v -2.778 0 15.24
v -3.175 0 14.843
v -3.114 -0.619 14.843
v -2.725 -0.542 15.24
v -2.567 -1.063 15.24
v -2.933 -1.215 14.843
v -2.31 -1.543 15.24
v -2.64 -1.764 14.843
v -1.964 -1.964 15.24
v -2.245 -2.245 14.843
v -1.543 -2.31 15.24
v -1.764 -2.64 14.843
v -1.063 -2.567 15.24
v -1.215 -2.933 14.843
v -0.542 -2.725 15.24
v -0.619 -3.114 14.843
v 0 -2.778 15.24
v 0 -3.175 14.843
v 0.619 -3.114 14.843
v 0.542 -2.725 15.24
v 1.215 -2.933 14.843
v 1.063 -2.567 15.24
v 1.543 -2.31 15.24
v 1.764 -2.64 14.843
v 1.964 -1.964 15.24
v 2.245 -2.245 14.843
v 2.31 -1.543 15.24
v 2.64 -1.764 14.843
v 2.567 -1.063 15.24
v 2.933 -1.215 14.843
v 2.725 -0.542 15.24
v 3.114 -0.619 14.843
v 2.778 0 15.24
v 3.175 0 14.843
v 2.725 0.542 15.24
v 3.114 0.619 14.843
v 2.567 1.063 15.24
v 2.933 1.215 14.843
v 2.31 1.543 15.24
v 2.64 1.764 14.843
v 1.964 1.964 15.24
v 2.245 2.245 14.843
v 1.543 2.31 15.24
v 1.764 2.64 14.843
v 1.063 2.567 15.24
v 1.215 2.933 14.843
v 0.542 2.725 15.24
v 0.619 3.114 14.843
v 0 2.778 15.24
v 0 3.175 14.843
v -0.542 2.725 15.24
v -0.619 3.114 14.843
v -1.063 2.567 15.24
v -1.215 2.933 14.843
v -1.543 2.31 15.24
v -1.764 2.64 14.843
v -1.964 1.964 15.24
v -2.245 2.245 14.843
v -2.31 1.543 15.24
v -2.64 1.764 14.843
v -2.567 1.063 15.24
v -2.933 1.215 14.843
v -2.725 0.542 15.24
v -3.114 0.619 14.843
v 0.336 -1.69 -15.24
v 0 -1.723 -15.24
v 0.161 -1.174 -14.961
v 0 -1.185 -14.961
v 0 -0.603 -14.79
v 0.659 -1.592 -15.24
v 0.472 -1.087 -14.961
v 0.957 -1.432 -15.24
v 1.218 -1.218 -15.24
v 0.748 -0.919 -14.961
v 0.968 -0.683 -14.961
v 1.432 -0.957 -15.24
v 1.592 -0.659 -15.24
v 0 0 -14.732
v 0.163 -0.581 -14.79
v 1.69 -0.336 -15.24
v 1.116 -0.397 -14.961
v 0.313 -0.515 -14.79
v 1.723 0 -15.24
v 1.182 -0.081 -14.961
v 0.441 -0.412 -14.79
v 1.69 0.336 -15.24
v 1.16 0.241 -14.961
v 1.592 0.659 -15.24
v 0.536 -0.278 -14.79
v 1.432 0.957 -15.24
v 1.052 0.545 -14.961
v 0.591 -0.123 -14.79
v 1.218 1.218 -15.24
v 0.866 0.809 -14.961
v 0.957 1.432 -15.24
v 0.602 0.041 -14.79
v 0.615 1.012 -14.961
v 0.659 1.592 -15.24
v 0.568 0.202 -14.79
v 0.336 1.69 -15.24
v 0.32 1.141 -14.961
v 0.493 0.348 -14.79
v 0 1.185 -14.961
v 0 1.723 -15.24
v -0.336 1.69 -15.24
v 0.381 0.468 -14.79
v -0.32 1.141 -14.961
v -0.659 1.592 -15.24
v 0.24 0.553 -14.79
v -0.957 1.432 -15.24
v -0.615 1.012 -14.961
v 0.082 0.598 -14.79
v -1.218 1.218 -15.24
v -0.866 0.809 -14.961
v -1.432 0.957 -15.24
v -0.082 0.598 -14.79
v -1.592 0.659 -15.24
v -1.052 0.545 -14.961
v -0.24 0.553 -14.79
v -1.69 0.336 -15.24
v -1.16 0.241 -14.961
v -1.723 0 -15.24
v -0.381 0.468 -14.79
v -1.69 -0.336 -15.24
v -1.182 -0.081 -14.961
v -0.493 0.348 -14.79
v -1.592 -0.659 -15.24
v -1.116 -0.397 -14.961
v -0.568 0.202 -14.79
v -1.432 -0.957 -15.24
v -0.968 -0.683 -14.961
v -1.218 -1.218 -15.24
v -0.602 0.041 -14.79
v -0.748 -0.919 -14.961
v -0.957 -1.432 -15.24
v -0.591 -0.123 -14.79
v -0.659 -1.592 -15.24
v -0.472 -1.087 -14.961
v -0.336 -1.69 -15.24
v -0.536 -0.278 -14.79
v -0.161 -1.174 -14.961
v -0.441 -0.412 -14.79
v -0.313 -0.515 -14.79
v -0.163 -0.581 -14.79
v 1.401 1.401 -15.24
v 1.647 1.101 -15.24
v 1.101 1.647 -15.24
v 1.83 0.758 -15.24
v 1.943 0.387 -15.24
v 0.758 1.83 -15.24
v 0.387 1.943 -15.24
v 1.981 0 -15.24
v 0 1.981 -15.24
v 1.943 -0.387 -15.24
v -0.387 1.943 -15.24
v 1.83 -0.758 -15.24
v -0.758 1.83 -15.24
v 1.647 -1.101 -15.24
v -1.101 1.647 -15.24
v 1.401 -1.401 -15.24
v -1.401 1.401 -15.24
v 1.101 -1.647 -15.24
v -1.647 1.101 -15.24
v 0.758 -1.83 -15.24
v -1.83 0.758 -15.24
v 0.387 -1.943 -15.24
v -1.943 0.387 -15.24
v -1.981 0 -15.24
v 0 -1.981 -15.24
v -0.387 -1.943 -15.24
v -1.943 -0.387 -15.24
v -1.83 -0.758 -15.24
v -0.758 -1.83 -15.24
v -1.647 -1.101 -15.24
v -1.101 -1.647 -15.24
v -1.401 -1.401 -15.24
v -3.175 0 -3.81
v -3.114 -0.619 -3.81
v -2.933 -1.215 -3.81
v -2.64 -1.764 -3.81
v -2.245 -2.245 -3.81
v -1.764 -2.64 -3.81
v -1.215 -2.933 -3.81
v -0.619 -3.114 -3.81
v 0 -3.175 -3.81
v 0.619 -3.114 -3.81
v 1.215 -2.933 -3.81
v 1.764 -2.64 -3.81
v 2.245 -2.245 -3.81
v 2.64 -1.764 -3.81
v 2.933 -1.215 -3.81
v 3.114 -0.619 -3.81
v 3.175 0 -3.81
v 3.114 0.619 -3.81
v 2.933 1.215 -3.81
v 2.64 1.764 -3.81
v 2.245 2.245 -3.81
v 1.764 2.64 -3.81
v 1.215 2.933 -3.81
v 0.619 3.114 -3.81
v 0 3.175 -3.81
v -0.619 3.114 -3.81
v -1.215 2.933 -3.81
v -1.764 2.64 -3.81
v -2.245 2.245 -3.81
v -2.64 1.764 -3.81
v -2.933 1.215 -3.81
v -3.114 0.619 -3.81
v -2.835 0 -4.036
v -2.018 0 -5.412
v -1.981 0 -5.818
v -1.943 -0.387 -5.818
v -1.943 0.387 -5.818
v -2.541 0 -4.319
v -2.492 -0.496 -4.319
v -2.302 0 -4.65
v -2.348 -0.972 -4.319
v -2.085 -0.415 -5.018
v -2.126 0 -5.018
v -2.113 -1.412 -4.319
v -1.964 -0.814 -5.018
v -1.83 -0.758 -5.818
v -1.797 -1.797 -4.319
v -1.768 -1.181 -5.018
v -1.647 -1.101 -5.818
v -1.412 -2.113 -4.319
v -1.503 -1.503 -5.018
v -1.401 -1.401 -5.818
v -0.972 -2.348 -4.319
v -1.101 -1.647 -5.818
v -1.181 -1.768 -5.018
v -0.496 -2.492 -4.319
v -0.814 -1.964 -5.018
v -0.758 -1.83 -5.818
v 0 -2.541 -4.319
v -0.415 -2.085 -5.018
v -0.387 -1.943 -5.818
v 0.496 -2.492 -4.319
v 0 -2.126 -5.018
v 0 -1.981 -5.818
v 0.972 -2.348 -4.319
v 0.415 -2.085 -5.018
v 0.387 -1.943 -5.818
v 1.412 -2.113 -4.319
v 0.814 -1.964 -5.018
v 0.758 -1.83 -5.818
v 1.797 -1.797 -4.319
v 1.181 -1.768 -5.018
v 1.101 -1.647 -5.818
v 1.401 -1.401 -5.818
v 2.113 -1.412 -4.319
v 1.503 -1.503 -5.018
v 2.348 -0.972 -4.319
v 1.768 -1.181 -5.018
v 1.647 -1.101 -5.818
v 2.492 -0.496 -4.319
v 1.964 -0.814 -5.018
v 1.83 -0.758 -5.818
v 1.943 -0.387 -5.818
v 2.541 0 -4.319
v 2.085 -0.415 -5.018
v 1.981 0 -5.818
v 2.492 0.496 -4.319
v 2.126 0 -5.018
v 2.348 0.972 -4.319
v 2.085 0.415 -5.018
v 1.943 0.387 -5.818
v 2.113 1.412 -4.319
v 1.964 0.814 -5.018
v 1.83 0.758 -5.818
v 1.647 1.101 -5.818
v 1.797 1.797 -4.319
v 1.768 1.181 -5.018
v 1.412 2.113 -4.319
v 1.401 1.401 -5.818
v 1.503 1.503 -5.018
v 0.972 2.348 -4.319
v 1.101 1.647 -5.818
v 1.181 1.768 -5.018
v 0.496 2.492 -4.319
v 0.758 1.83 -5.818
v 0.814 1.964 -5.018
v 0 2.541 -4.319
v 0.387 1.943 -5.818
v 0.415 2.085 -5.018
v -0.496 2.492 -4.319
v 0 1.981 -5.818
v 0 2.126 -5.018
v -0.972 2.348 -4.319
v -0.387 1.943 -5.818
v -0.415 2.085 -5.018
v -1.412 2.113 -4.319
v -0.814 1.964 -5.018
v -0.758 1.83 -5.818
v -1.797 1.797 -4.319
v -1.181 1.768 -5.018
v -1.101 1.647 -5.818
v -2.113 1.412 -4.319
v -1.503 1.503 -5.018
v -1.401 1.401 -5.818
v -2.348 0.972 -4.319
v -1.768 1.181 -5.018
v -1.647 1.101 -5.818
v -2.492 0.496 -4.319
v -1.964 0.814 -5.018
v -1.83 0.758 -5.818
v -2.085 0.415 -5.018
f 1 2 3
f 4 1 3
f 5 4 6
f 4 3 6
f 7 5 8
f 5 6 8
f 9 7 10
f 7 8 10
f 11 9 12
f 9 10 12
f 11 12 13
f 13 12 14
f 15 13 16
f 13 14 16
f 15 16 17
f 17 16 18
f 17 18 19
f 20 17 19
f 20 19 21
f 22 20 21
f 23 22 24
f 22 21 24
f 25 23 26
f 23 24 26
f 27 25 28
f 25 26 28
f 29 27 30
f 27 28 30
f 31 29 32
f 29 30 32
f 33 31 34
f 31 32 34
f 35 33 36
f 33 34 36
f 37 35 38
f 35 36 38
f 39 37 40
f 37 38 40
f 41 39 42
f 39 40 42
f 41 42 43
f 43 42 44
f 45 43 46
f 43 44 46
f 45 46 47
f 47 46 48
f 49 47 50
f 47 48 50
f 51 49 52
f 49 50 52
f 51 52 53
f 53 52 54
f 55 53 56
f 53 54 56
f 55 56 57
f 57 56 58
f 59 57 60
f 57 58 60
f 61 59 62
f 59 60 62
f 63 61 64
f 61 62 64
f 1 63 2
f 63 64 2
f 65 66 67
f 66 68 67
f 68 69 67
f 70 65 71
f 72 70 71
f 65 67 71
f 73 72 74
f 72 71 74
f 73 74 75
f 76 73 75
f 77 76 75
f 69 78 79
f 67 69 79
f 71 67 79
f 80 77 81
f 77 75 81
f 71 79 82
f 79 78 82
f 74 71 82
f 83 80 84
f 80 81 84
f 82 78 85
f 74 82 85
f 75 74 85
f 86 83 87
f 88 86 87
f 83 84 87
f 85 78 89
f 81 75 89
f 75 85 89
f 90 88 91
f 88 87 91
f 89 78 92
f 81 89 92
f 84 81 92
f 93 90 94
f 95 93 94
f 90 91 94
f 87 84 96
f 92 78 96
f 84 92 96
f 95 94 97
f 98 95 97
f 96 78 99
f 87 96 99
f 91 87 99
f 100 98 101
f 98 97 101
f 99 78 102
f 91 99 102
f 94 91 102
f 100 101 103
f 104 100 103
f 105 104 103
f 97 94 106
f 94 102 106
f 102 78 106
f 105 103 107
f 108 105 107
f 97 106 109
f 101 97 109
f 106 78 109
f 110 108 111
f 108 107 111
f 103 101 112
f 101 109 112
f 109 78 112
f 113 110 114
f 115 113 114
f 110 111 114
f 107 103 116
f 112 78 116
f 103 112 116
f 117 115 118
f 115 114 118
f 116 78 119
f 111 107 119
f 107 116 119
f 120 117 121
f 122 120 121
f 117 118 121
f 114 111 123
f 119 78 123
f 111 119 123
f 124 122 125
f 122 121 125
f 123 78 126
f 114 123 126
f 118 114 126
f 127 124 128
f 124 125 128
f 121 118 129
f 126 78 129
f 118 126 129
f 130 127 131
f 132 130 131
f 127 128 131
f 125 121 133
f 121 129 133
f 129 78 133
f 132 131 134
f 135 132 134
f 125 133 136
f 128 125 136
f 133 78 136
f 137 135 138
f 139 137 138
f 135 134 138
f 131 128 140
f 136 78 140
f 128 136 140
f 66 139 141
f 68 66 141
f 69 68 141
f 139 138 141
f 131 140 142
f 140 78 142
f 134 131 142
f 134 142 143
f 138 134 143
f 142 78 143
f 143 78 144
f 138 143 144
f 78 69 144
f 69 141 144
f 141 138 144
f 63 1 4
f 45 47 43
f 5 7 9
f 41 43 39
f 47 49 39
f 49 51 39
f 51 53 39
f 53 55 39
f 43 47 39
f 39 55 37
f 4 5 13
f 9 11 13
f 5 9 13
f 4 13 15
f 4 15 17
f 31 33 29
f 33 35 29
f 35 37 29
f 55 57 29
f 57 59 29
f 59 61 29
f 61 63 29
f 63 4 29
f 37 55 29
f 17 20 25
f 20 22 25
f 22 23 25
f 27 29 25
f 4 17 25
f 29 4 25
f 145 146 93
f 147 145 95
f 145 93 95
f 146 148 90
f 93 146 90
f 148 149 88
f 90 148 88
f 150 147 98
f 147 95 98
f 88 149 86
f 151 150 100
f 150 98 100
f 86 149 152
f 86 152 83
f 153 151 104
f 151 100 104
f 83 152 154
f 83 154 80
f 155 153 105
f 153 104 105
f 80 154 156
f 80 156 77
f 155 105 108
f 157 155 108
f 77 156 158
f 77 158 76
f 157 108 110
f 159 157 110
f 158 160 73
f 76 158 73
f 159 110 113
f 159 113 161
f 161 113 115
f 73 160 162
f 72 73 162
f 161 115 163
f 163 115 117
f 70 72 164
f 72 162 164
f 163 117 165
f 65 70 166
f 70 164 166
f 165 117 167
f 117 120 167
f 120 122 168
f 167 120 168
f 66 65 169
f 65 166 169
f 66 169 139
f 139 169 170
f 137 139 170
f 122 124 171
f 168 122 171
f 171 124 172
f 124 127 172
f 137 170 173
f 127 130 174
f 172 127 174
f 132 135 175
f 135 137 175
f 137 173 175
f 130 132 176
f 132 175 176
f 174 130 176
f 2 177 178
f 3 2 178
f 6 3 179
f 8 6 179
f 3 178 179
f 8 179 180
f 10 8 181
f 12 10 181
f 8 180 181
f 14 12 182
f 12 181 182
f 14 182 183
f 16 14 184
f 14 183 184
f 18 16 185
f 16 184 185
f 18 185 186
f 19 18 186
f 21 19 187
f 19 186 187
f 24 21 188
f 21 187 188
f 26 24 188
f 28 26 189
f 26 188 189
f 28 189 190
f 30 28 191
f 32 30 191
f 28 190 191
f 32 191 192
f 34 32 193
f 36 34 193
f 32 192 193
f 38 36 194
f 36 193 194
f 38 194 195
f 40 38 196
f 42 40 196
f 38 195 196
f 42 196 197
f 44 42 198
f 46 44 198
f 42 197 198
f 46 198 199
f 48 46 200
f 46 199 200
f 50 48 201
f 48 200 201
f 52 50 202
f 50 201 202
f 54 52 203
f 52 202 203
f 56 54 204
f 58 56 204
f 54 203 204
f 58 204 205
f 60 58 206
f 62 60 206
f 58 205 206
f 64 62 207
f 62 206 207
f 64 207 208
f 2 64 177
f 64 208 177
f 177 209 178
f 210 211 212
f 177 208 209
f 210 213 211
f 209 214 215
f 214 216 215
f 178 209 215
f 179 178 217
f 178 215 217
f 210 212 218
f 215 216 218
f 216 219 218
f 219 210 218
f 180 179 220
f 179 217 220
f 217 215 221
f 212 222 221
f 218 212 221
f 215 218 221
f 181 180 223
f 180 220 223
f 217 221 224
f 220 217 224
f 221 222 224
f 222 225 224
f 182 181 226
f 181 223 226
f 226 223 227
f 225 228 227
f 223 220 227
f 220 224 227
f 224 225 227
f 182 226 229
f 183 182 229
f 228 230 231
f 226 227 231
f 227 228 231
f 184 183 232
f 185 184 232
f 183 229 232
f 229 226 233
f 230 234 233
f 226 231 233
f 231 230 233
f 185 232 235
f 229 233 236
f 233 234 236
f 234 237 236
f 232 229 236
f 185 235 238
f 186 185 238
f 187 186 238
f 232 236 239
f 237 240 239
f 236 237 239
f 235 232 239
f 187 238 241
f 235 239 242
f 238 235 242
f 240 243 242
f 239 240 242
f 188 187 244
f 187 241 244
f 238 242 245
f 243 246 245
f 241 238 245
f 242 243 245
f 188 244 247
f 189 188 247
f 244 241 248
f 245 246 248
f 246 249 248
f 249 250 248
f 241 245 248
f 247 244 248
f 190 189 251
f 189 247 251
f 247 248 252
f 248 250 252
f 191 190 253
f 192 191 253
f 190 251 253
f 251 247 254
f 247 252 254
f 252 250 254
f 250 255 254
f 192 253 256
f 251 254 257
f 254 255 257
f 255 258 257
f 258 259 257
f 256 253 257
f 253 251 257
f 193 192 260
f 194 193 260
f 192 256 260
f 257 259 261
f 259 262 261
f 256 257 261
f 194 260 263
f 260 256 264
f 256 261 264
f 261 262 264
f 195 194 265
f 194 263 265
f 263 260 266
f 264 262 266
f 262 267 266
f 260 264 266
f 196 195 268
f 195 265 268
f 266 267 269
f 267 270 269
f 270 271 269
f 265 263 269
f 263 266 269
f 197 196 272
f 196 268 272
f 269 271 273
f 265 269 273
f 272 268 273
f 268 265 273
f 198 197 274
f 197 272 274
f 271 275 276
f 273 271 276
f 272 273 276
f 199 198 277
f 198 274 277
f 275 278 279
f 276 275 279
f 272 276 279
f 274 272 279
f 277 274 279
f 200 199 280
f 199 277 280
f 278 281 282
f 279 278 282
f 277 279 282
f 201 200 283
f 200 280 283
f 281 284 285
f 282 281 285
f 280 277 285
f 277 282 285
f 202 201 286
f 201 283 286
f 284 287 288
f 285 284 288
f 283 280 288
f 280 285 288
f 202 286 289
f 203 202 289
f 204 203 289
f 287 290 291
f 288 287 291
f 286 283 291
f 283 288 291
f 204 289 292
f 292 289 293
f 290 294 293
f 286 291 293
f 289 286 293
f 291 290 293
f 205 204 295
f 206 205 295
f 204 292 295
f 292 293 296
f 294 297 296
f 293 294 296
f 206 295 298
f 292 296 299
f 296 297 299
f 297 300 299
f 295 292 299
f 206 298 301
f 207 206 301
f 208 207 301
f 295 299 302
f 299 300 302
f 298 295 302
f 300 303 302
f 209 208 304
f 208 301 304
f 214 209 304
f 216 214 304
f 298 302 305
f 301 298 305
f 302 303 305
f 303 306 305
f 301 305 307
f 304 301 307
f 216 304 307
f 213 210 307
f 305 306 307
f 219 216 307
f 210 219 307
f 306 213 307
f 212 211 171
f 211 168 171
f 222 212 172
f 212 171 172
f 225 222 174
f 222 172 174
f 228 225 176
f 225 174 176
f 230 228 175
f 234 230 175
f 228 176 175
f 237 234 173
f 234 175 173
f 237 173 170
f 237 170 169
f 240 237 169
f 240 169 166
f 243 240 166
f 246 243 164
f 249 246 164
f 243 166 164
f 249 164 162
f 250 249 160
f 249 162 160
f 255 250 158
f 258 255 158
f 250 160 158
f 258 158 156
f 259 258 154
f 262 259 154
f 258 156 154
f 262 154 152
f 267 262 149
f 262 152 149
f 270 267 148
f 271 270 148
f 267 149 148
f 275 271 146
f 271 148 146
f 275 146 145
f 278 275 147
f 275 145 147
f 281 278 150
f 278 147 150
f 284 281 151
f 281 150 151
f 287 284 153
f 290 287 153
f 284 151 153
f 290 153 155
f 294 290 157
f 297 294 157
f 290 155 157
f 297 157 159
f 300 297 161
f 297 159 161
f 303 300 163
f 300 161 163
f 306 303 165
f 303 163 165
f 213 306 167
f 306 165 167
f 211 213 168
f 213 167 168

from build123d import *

# Parameters (mm, degrees)
CHAFL_N1_SIZE = 0.396875


with BuildPart() as part:
    # Croquis1 → Revolución1 (revolve)
    with BuildSketch(Plane(origin=(0, 0, 0), x_dir=(0, 0, -1), z_dir=(1, 0, 0)), mode=Mode.PRIVATE) as revoluci_n1_sk:
        with BuildLine():
            Line((-15.24, 0), (-15.24, 3.175))
            Line((-15.24, 3.175), (3.81, 3.175))
            ThreePointArc((3.81, 3.175), (4.650083071, 2.302185344), (5.818206951, 1.9812))
            Line((5.818206951, 1.9812), (15.24, 1.9812))
            Line((15.24, 1.9812), (15.24, 0))
            Line((15.24, 0), (-15.24, 0))
        make_face()
    revolve(revoluci_n1_sk.sketch.rotate(Axis((0, 0, -127), (0, 0, 1)), 90), axis=Axis((0, 0, -127), (0, 0, 1)))

    # Croquis4 → Cortar-Revolución1 (revolve, cut)
    with BuildSketch(Plane(origin=(0, 0, 0), x_dir=(0, 0, -1), z_dir=(1, 0, 0)), mode=Mode.PRIVATE) as cortar_revoluci_n1_sk:
        with BuildLine():
            ThreePointArc((15.24, 1.722711816), (14.861646983, 0.898025612), (14.732, 0))
            Line((14.732, 0), (15.24, 0))
            Line((15.24, 0), (15.24, 1.722711816))
        make_face()
        with BuildLine():
            ThreePointArc((14.732, 0), (14.861646983, 0.898025612), (15.24, 1.722711816))
            Line((15.24, 1.722711816), (15.24, 0))
            Line((15.24, 0), (14.732, 0))
        make_face()
    revolve(cortar_revoluci_n1_sk.sketch.rotate(Axis((0, 0, -15.24), (0, 0, 1)), 180), axis=Axis((0, 0, -15.24), (0, 0, 1)), mode=Mode.SUBTRACT)

    # Chaflán1
    chafl_n1_edges = [part.edges().sort_by_distance(p)[0] for p in [
        (3.175, 0, 15.24),
    ]]
    chamfer(chafl_n1_edges, length=CHAFL_N1_SIZE)


solid = part.part
